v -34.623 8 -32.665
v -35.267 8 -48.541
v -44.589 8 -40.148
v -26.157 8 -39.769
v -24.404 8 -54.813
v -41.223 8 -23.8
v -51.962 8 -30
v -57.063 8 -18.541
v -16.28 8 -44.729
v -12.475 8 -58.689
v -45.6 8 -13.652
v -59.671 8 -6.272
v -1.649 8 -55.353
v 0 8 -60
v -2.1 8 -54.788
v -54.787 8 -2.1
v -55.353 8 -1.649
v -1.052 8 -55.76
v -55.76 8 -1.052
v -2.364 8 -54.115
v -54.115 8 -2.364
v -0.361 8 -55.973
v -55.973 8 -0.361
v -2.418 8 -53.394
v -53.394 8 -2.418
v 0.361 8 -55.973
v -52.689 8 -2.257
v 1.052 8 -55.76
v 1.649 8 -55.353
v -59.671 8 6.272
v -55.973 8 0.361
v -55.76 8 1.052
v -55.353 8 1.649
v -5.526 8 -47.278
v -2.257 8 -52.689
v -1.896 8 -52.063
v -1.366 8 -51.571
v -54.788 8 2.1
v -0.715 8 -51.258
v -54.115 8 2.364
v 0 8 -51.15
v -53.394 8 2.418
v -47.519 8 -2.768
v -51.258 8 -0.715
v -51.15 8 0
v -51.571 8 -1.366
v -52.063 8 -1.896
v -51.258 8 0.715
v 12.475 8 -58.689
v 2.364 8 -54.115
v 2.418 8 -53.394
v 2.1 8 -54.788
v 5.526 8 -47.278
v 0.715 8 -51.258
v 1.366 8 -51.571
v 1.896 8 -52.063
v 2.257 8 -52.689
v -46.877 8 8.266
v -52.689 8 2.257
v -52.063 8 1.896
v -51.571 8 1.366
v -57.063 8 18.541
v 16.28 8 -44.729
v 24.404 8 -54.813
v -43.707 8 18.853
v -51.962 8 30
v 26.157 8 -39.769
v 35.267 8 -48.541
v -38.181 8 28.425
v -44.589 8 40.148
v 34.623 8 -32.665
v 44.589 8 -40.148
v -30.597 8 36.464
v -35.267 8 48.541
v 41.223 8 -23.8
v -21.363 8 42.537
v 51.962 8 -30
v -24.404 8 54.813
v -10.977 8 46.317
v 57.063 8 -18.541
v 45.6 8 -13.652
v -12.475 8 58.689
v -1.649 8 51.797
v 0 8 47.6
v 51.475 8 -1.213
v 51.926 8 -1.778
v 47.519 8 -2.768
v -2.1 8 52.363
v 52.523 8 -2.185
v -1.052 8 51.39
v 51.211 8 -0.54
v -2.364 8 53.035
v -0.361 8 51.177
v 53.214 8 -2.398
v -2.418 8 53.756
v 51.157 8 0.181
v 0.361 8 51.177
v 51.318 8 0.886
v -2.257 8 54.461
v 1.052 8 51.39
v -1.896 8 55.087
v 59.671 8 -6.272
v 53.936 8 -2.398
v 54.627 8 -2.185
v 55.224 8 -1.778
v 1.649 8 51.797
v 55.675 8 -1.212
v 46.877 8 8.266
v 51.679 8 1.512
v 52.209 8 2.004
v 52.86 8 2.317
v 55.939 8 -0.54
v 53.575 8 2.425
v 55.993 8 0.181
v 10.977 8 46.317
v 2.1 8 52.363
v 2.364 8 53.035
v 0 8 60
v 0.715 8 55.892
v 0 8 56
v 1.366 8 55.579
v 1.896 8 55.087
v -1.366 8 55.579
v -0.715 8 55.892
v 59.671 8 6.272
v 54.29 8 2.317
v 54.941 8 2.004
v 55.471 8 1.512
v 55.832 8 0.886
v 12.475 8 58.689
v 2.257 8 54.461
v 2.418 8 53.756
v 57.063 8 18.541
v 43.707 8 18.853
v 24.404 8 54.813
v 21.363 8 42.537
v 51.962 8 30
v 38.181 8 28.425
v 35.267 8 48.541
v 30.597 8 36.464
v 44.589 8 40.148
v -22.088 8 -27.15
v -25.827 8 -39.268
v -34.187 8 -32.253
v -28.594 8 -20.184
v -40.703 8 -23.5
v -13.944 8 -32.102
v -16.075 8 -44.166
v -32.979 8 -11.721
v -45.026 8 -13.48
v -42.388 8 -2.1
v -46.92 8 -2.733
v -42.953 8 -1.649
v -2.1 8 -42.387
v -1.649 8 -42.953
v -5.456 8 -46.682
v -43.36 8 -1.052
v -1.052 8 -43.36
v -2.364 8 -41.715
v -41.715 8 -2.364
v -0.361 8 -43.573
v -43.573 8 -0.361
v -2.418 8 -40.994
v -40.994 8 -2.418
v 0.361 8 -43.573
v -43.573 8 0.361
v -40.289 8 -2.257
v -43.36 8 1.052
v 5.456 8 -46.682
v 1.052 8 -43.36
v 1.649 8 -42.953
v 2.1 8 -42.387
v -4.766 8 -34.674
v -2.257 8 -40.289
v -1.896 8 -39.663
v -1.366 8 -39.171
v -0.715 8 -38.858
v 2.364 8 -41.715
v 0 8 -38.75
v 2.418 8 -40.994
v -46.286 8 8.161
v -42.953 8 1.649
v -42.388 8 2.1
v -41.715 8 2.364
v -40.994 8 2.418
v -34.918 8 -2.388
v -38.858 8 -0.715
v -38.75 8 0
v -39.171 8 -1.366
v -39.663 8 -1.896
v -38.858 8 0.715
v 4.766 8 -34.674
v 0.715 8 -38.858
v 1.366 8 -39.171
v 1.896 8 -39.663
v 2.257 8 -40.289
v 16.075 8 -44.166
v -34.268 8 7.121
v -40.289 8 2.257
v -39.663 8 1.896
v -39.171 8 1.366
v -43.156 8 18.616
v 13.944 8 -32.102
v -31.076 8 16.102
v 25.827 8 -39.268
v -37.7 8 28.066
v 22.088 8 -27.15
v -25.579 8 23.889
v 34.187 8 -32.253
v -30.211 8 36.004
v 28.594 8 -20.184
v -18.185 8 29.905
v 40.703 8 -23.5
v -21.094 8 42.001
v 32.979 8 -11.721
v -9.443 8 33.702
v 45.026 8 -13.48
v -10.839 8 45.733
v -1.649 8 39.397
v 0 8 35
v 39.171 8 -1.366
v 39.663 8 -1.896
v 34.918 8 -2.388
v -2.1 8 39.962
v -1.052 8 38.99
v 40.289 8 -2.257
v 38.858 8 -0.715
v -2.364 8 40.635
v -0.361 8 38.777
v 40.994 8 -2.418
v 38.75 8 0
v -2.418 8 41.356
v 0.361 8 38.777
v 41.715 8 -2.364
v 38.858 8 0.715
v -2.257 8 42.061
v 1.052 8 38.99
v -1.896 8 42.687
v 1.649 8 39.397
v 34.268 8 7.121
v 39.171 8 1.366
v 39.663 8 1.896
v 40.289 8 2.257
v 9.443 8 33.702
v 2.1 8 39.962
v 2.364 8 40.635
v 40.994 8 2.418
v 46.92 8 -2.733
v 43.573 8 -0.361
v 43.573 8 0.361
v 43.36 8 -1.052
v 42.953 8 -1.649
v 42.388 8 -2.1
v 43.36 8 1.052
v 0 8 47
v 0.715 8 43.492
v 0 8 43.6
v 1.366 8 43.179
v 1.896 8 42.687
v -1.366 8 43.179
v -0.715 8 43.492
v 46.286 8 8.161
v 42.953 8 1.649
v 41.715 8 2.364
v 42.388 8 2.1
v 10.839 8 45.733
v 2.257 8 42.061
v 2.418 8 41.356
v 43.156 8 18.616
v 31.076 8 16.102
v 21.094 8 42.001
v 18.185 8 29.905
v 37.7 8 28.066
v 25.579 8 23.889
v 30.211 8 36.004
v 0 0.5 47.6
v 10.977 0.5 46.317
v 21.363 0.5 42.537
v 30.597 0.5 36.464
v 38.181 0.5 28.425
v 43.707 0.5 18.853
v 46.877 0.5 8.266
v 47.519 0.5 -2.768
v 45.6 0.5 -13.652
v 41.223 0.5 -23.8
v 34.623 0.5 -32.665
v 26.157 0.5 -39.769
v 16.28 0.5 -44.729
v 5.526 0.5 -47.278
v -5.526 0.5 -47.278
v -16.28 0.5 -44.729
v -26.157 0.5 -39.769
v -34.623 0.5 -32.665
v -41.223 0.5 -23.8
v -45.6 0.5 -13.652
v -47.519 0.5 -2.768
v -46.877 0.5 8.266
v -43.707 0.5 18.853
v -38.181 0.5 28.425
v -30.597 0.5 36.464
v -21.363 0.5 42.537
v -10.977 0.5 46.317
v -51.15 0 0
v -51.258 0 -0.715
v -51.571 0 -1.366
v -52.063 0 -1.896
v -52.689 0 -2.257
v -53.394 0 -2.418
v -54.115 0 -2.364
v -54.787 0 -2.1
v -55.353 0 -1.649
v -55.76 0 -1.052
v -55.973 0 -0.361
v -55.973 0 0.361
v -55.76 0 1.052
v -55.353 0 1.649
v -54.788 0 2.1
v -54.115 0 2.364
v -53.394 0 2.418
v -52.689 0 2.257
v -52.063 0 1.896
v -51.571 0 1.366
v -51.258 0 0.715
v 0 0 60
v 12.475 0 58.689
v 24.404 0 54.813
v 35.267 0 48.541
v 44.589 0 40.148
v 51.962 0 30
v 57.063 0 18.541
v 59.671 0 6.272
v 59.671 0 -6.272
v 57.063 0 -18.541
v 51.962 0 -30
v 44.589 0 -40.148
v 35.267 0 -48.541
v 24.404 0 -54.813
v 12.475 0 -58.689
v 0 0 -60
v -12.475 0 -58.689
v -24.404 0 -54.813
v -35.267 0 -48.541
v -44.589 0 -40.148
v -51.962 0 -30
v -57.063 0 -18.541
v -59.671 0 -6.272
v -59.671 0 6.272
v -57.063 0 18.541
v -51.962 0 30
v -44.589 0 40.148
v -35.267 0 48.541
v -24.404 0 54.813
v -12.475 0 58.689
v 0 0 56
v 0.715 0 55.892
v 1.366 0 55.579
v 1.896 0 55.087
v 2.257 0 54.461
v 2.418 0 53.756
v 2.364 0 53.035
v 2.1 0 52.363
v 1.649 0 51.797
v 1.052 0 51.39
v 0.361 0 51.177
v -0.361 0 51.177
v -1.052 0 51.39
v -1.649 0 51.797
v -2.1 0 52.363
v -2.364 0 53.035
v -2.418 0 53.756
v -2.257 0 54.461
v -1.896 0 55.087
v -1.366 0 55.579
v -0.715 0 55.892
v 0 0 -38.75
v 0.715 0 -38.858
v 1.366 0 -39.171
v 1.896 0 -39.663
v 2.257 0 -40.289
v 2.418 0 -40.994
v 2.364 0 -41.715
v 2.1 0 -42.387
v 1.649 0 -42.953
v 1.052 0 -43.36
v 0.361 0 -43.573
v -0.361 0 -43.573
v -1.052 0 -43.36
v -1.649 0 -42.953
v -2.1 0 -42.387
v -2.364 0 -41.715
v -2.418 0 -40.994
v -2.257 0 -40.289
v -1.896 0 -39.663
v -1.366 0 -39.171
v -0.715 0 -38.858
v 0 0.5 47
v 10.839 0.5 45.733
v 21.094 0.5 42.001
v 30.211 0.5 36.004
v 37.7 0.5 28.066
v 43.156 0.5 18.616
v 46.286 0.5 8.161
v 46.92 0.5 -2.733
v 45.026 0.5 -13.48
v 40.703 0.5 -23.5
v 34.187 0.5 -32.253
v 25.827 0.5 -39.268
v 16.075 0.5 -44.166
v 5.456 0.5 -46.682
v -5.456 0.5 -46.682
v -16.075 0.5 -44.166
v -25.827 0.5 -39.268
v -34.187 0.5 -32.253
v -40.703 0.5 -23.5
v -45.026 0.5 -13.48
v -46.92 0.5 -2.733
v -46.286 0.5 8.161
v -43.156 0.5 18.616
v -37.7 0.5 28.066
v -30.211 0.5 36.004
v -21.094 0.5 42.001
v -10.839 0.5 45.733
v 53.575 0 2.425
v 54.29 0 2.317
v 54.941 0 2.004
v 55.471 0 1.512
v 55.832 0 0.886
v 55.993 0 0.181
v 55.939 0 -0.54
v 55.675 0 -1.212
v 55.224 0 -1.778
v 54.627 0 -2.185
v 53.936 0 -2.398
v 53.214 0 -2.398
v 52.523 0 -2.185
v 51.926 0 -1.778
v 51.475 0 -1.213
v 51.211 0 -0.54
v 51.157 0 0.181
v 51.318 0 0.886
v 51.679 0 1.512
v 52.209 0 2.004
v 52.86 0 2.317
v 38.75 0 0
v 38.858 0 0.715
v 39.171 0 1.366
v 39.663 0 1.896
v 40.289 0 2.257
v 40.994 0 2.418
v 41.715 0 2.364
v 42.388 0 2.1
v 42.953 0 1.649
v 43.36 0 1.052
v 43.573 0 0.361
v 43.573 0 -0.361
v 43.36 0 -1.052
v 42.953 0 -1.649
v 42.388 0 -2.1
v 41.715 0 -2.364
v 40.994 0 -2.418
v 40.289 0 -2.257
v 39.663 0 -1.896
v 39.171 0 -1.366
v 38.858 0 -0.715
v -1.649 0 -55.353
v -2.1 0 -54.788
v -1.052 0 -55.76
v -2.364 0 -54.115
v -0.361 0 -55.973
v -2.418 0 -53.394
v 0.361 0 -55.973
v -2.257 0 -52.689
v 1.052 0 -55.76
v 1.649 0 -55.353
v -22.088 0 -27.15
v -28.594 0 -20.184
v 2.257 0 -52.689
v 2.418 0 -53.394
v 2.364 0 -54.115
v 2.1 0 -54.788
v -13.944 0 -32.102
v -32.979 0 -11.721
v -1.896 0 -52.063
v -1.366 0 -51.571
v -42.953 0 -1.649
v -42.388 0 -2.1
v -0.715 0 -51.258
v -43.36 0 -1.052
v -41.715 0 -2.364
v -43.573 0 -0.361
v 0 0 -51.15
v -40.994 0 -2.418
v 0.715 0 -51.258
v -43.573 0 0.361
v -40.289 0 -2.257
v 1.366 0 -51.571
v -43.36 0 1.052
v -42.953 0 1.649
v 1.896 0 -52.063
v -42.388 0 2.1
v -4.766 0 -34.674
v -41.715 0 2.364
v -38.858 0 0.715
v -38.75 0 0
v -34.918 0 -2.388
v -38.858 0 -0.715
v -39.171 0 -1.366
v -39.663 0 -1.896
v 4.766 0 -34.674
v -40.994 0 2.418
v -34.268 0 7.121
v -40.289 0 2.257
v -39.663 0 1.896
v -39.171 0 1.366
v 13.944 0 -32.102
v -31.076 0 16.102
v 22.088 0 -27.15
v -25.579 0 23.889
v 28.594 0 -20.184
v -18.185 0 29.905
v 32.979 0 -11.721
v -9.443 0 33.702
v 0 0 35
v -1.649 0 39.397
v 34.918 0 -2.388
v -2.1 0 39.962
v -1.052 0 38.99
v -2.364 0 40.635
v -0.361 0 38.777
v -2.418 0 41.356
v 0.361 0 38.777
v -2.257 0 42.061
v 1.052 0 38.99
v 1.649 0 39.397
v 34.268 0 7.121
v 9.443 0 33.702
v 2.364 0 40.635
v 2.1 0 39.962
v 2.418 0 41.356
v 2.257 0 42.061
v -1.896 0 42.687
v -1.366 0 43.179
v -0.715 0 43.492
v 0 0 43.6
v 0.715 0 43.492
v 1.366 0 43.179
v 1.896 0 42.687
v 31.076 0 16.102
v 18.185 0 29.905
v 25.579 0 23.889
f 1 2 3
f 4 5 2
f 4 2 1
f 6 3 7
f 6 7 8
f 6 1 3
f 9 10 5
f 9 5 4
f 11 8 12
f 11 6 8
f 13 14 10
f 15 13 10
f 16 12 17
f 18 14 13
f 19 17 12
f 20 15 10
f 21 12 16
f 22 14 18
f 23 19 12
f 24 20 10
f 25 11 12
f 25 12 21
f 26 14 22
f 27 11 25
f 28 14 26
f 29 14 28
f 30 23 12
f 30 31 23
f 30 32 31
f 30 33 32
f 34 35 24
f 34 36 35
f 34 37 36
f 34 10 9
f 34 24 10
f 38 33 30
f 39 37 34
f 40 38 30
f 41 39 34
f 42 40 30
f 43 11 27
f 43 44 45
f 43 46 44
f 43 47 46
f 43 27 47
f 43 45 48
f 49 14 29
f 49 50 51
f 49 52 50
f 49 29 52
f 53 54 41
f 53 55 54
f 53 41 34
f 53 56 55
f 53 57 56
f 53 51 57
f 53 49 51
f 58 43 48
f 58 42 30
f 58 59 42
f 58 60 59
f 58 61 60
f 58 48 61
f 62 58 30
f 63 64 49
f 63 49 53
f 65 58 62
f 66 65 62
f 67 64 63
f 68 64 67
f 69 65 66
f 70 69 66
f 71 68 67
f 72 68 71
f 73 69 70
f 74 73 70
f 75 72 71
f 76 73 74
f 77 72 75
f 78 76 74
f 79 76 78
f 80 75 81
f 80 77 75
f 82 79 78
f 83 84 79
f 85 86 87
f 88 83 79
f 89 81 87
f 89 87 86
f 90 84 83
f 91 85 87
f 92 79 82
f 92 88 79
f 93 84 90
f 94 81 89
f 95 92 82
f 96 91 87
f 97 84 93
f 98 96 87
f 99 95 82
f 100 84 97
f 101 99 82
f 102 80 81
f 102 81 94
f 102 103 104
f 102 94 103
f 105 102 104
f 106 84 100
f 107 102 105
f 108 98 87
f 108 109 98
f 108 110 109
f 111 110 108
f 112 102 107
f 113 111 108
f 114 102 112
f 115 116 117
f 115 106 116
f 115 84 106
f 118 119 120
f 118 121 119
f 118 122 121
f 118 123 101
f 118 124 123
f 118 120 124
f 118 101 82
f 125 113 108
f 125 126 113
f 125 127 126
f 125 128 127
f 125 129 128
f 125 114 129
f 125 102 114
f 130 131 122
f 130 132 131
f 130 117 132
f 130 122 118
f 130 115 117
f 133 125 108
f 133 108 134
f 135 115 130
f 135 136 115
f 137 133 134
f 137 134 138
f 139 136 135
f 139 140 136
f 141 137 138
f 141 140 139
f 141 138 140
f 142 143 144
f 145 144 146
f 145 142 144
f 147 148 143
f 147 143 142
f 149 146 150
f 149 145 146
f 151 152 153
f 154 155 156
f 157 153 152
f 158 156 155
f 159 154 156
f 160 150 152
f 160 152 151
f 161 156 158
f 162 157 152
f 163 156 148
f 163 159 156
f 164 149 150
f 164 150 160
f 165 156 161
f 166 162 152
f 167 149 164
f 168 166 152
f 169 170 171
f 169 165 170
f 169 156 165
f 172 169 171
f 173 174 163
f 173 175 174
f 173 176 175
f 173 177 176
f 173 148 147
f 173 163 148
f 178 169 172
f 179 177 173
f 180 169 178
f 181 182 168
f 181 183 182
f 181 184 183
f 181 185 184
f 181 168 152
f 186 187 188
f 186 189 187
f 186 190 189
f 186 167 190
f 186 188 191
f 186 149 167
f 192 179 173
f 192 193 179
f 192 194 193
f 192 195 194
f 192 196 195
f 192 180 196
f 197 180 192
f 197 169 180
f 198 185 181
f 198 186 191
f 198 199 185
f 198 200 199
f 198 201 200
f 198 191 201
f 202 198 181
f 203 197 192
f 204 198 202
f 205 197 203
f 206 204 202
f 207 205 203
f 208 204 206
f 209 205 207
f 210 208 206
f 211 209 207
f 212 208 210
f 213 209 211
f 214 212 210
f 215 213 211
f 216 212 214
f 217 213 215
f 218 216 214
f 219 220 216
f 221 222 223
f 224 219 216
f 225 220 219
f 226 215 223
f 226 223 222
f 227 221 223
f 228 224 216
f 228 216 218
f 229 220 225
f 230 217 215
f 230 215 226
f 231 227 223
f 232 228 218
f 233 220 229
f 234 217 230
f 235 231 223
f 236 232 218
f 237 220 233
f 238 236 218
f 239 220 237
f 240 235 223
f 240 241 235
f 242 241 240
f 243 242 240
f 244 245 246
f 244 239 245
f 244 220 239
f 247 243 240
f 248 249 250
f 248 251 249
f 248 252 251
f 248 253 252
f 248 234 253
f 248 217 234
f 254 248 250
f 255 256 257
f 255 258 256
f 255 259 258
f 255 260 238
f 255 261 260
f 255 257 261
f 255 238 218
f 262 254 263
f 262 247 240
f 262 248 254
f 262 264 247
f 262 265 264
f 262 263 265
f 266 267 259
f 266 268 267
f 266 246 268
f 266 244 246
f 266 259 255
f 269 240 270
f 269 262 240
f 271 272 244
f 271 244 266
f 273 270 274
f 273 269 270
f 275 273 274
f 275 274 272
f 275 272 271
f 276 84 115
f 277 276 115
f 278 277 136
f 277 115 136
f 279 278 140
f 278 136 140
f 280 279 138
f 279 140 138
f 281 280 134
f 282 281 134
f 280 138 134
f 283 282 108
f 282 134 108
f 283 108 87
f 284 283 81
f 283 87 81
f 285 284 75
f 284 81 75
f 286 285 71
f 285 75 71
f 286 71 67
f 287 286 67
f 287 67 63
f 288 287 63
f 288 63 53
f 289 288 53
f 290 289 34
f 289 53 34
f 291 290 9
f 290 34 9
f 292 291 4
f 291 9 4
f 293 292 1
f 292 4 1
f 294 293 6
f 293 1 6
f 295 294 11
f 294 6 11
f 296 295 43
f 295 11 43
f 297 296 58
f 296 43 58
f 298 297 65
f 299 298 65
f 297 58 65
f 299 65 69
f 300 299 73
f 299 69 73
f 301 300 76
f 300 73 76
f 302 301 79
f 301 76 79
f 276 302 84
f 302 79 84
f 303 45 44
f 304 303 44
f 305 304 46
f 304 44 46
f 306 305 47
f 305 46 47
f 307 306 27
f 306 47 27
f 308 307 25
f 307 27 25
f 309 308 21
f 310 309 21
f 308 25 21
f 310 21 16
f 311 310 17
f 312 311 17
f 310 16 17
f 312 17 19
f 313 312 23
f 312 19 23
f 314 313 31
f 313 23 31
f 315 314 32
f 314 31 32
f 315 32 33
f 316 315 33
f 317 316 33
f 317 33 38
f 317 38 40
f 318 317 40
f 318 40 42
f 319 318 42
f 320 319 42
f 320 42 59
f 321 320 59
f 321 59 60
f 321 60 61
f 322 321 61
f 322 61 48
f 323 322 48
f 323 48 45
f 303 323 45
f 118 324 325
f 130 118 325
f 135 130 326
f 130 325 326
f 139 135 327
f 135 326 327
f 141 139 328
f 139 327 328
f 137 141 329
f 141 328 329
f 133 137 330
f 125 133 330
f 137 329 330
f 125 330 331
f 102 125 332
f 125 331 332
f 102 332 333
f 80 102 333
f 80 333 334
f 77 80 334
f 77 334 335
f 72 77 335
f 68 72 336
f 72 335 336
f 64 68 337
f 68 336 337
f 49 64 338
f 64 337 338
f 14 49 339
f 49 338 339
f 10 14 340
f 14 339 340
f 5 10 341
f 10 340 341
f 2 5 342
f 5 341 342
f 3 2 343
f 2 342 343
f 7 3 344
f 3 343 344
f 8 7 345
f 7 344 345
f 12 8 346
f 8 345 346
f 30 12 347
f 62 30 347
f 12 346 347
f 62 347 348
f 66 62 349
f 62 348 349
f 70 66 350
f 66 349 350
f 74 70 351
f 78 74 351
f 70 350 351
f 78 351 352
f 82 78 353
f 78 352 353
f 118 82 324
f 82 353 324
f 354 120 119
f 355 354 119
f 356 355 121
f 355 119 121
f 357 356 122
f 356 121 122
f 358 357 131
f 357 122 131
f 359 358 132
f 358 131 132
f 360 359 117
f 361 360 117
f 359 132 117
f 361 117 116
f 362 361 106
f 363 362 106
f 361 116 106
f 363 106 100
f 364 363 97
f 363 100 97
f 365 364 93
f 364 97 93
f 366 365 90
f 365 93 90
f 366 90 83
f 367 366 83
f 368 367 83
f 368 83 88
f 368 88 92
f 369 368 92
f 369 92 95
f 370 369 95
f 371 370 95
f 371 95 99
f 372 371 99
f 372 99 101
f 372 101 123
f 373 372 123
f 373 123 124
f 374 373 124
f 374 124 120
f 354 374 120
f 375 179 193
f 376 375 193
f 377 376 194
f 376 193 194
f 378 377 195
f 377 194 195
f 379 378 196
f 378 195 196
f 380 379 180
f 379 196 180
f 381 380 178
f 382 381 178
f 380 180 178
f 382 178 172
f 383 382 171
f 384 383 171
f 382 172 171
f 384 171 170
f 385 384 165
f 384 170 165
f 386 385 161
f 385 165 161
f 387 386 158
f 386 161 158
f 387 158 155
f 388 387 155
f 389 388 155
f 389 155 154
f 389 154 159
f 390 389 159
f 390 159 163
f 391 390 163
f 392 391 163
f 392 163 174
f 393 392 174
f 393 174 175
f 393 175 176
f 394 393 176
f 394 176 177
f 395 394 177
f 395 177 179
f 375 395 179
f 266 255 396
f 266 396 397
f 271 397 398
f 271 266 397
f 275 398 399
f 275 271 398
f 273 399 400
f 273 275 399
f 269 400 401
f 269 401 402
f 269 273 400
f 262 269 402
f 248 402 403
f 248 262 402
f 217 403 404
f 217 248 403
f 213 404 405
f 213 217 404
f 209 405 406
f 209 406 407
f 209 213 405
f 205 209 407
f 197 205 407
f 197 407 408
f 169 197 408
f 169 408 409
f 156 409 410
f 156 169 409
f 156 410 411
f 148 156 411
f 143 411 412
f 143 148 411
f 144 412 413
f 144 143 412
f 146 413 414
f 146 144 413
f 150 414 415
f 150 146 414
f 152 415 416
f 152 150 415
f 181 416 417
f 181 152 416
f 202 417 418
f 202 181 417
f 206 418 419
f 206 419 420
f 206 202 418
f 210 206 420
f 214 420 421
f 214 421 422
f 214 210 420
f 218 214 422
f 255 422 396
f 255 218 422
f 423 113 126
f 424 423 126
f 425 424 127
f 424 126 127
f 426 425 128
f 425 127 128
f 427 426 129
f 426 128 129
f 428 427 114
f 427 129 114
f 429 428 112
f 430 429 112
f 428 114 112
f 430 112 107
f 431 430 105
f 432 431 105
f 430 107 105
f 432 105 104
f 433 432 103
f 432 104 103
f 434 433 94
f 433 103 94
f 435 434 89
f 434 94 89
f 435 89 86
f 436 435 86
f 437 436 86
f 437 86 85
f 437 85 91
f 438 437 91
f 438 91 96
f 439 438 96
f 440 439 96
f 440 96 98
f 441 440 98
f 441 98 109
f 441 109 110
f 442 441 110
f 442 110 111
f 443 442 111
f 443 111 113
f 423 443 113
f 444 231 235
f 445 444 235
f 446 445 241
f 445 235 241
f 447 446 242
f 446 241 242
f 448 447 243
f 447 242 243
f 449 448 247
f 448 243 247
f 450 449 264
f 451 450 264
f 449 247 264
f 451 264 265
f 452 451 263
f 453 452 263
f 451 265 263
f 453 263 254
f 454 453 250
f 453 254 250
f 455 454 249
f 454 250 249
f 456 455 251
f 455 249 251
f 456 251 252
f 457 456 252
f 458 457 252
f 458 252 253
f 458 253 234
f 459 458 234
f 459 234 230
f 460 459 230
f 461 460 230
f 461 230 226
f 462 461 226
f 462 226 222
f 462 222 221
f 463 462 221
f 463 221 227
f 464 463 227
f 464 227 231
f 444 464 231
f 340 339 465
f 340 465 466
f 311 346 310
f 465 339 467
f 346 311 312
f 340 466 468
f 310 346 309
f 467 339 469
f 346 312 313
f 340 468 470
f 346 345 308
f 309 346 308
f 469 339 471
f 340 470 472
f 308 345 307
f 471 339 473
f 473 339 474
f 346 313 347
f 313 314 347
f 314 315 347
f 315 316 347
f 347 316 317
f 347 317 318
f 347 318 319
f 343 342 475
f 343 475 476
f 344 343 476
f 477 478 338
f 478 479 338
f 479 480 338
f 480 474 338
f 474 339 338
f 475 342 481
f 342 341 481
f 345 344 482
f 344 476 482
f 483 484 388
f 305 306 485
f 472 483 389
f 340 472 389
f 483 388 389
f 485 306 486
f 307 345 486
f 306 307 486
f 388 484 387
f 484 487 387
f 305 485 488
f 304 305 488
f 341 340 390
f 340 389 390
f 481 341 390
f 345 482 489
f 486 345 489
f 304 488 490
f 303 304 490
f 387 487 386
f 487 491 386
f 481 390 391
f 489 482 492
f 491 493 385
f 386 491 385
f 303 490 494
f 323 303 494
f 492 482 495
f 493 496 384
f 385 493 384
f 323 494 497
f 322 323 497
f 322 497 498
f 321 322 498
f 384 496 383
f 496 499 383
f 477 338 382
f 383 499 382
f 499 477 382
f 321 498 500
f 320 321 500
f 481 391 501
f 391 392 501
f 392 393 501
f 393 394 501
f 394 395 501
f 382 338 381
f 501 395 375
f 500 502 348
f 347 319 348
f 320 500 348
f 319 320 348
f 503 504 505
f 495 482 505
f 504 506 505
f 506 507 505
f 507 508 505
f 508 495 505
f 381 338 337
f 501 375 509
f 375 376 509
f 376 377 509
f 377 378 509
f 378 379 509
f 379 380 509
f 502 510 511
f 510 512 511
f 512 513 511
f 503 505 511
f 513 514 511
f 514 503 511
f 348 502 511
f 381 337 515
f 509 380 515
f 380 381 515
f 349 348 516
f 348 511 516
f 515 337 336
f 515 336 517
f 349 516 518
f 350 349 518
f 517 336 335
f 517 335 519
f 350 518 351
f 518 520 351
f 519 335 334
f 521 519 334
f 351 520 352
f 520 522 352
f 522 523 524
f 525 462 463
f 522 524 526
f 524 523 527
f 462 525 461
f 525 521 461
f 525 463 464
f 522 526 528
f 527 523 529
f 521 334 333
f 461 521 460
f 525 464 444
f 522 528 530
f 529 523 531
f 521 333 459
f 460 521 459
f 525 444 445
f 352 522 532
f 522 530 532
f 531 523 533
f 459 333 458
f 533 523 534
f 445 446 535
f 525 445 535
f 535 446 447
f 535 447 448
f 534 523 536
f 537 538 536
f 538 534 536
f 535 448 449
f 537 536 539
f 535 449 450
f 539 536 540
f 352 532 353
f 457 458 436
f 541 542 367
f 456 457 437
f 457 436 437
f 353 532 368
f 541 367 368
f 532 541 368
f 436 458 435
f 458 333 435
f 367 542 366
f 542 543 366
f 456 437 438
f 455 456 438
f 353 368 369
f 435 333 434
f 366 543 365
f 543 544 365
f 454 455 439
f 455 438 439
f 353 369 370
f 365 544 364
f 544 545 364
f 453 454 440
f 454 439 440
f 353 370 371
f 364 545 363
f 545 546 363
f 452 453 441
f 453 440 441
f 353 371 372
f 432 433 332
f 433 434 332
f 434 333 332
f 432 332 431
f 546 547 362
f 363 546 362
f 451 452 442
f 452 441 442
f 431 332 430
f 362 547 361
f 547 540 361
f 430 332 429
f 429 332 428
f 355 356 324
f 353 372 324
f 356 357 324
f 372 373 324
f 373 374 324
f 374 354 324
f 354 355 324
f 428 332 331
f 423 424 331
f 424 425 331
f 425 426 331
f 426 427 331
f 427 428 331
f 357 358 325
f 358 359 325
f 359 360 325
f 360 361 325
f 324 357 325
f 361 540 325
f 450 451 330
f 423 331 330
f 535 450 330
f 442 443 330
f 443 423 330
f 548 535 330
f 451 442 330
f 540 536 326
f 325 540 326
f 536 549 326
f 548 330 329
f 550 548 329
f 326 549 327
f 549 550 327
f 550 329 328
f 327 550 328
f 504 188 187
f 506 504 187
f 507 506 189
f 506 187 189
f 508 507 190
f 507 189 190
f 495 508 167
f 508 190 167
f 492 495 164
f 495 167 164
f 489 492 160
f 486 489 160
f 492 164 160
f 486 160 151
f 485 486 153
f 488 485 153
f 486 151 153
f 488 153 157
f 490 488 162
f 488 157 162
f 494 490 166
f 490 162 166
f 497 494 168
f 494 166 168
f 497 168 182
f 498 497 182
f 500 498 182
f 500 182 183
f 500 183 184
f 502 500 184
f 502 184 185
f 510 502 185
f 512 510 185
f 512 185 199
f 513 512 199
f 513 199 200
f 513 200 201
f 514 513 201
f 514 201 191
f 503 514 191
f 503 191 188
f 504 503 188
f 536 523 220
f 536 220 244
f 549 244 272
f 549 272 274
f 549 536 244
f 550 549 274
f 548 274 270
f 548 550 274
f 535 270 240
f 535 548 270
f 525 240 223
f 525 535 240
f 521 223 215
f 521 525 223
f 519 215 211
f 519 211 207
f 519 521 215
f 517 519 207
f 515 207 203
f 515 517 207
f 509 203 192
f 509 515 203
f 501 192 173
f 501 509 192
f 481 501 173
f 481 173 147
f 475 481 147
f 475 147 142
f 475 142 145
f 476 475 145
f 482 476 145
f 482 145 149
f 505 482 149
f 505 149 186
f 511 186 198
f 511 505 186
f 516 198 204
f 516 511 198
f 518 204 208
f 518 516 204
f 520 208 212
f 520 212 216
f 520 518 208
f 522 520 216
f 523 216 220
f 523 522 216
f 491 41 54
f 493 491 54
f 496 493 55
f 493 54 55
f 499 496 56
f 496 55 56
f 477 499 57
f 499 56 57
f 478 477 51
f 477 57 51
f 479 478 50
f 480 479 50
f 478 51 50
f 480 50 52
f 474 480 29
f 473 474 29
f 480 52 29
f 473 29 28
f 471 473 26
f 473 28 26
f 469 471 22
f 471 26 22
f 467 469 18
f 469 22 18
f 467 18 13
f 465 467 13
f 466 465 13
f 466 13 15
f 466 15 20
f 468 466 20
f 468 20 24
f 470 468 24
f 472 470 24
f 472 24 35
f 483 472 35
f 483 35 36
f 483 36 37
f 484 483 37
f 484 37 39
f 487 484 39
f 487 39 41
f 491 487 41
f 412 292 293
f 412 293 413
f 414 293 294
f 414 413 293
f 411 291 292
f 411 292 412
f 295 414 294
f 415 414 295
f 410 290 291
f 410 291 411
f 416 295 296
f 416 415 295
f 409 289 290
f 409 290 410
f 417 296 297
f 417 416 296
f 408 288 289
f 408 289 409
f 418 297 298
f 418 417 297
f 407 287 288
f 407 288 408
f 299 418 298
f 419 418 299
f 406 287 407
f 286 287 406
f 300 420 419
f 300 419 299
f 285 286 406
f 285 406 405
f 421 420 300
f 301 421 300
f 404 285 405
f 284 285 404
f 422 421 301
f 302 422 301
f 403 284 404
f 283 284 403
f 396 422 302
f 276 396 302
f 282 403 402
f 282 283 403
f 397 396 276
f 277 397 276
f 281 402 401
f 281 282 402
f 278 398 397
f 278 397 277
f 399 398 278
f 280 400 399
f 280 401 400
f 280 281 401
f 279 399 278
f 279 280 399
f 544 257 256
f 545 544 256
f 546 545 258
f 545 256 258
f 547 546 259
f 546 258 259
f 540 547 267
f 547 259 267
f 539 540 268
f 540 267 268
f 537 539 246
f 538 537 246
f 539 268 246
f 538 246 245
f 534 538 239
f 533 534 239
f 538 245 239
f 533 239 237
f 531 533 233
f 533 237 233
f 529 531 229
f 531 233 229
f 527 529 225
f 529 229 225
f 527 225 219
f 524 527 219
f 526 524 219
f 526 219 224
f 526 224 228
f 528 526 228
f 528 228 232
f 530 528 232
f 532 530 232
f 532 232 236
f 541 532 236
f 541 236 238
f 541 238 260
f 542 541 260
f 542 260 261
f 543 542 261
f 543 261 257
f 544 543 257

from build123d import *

# Parameters (mm, degrees)
SKETCH_1_R          = 60
SKETCH_1_R_2        = 35
EXTRUDE_1_DEPTH     = 8
SKETCH_2_R          = 47.6
SKETCH_2_R_2        = 47
CUT_EXTRUDE_1_DEPTH = 7.5
SKETCH_3_R          = 2.425
CUT_EXTRUDE_2_DEPTH = 86.229103011
SKETCH_4_R          = 2.425
CUT_EXTRUDE_3_DEPTH = 86.229103011


with BuildPart() as part:
    # 草图1 → 凸台-拉伸1 (new body)
    with BuildSketch(Plane(origin=(0, 0, 0), x_dir=(1, 0, 0), z_dir=(0, 1, 0))):
        with Locations(Location((0, 0, 0), (0, 0, 270))):
            Circle(SKETCH_1_R)
        with Locations(Location((0, 0, 0), (0, 0, 270))):
            Circle(SKETCH_1_R_2, mode=Mode.SUBTRACT)
    extrude(amount=EXTRUDE_1_DEPTH)

    # 草图2 → 切除-拉伸1 (cut)
    with BuildSketch(Plane(origin=(0, 8, 0), x_dir=(1, 0, 0), z_dir=(0, 1, 0))):
        with Locations(Location((0, 0, 0), (0, 0, 270))):
            Circle(SKETCH_2_R)
        with Locations(Location((0, 0, 0), (0, 0, 270))):
            Circle(SKETCH_2_R_2, mode=Mode.SUBTRACT)
    extrude(amount=-CUT_EXTRUDE_1_DEPTH, mode=Mode.SUBTRACT)

    # 草图3 → 切除-拉伸2 (cut, through all)
    with BuildSketch(Plane(origin=(0, 8, 0), x_dir=(1, 0, 0), z_dir=(0, 1, 0))):
        with BuildLine():
            ThreePointArc((-43.6, 0), (-41.175, -2.425), (-38.75, 0))
            Line((-38.75, 0), (-43.6, 0))
        make_face()
        with BuildLine():
            Line((-43.6, 0), (-38.75, 0))
            ThreePointArc((-38.75, 0), (-41.175, 2.425), (-43.6, 0))
        make_face()
        with Locations(Location((0, 41.175, 0), (0, 0, 270))):
            Circle(SKETCH_3_R)
        with BuildLine():
            ThreePointArc((43.6, 0), (41.175, 2.425), (38.75, 0))
            Line((38.75, 0), (43.6, 0))
        make_face()
        with BuildLine():
            Line((43.6, 0), (38.75, 0))
            ThreePointArc((38.75, 0), (41.175, -2.425), (43.6, 0))
        make_face()
        with Locations(Location((0, -41.175, 0), (0, 0, 270))):
            Circle(SKETCH_3_R)
    extrude(amount=-CUT_EXTRUDE_2_DEPTH, mode=Mode.SUBTRACT)

    # 草图4 → 切除-拉伸3 (cut, through all)
    with BuildSketch(Plane(origin=(0, 8, 0), x_dir=(1, 0, 0), z_dir=(0, 1, 0))):
        with Locations(Location((0, 53.575, 0), (0, 0, 270))):
            Circle(SKETCH_4_R)
        with Locations(Location((53.575, 0, 0), (0, 0, 270))):
            Circle(SKETCH_4_R)
        with Locations(Location((0, -53.575, 0), (0, 0, 270))):
            Circle(SKETCH_4_R)
        with BuildLine():
            ThreePointArc((-56, 0), (-53.575, -2.425), (-51.15, 0))
            Line((-51.15, 0), (-56, 0))
        make_face()
        with BuildLine():
            Line((-56, 0), (-51.15, 0))
            ThreePointArc((-51.15, 0), (-53.575, 2.425), (-56, 0))
        make_face()
    extrude(amount=-CUT_EXTRUDE_3_DEPTH, mode=Mode.SUBTRACT)


solid = part.part
